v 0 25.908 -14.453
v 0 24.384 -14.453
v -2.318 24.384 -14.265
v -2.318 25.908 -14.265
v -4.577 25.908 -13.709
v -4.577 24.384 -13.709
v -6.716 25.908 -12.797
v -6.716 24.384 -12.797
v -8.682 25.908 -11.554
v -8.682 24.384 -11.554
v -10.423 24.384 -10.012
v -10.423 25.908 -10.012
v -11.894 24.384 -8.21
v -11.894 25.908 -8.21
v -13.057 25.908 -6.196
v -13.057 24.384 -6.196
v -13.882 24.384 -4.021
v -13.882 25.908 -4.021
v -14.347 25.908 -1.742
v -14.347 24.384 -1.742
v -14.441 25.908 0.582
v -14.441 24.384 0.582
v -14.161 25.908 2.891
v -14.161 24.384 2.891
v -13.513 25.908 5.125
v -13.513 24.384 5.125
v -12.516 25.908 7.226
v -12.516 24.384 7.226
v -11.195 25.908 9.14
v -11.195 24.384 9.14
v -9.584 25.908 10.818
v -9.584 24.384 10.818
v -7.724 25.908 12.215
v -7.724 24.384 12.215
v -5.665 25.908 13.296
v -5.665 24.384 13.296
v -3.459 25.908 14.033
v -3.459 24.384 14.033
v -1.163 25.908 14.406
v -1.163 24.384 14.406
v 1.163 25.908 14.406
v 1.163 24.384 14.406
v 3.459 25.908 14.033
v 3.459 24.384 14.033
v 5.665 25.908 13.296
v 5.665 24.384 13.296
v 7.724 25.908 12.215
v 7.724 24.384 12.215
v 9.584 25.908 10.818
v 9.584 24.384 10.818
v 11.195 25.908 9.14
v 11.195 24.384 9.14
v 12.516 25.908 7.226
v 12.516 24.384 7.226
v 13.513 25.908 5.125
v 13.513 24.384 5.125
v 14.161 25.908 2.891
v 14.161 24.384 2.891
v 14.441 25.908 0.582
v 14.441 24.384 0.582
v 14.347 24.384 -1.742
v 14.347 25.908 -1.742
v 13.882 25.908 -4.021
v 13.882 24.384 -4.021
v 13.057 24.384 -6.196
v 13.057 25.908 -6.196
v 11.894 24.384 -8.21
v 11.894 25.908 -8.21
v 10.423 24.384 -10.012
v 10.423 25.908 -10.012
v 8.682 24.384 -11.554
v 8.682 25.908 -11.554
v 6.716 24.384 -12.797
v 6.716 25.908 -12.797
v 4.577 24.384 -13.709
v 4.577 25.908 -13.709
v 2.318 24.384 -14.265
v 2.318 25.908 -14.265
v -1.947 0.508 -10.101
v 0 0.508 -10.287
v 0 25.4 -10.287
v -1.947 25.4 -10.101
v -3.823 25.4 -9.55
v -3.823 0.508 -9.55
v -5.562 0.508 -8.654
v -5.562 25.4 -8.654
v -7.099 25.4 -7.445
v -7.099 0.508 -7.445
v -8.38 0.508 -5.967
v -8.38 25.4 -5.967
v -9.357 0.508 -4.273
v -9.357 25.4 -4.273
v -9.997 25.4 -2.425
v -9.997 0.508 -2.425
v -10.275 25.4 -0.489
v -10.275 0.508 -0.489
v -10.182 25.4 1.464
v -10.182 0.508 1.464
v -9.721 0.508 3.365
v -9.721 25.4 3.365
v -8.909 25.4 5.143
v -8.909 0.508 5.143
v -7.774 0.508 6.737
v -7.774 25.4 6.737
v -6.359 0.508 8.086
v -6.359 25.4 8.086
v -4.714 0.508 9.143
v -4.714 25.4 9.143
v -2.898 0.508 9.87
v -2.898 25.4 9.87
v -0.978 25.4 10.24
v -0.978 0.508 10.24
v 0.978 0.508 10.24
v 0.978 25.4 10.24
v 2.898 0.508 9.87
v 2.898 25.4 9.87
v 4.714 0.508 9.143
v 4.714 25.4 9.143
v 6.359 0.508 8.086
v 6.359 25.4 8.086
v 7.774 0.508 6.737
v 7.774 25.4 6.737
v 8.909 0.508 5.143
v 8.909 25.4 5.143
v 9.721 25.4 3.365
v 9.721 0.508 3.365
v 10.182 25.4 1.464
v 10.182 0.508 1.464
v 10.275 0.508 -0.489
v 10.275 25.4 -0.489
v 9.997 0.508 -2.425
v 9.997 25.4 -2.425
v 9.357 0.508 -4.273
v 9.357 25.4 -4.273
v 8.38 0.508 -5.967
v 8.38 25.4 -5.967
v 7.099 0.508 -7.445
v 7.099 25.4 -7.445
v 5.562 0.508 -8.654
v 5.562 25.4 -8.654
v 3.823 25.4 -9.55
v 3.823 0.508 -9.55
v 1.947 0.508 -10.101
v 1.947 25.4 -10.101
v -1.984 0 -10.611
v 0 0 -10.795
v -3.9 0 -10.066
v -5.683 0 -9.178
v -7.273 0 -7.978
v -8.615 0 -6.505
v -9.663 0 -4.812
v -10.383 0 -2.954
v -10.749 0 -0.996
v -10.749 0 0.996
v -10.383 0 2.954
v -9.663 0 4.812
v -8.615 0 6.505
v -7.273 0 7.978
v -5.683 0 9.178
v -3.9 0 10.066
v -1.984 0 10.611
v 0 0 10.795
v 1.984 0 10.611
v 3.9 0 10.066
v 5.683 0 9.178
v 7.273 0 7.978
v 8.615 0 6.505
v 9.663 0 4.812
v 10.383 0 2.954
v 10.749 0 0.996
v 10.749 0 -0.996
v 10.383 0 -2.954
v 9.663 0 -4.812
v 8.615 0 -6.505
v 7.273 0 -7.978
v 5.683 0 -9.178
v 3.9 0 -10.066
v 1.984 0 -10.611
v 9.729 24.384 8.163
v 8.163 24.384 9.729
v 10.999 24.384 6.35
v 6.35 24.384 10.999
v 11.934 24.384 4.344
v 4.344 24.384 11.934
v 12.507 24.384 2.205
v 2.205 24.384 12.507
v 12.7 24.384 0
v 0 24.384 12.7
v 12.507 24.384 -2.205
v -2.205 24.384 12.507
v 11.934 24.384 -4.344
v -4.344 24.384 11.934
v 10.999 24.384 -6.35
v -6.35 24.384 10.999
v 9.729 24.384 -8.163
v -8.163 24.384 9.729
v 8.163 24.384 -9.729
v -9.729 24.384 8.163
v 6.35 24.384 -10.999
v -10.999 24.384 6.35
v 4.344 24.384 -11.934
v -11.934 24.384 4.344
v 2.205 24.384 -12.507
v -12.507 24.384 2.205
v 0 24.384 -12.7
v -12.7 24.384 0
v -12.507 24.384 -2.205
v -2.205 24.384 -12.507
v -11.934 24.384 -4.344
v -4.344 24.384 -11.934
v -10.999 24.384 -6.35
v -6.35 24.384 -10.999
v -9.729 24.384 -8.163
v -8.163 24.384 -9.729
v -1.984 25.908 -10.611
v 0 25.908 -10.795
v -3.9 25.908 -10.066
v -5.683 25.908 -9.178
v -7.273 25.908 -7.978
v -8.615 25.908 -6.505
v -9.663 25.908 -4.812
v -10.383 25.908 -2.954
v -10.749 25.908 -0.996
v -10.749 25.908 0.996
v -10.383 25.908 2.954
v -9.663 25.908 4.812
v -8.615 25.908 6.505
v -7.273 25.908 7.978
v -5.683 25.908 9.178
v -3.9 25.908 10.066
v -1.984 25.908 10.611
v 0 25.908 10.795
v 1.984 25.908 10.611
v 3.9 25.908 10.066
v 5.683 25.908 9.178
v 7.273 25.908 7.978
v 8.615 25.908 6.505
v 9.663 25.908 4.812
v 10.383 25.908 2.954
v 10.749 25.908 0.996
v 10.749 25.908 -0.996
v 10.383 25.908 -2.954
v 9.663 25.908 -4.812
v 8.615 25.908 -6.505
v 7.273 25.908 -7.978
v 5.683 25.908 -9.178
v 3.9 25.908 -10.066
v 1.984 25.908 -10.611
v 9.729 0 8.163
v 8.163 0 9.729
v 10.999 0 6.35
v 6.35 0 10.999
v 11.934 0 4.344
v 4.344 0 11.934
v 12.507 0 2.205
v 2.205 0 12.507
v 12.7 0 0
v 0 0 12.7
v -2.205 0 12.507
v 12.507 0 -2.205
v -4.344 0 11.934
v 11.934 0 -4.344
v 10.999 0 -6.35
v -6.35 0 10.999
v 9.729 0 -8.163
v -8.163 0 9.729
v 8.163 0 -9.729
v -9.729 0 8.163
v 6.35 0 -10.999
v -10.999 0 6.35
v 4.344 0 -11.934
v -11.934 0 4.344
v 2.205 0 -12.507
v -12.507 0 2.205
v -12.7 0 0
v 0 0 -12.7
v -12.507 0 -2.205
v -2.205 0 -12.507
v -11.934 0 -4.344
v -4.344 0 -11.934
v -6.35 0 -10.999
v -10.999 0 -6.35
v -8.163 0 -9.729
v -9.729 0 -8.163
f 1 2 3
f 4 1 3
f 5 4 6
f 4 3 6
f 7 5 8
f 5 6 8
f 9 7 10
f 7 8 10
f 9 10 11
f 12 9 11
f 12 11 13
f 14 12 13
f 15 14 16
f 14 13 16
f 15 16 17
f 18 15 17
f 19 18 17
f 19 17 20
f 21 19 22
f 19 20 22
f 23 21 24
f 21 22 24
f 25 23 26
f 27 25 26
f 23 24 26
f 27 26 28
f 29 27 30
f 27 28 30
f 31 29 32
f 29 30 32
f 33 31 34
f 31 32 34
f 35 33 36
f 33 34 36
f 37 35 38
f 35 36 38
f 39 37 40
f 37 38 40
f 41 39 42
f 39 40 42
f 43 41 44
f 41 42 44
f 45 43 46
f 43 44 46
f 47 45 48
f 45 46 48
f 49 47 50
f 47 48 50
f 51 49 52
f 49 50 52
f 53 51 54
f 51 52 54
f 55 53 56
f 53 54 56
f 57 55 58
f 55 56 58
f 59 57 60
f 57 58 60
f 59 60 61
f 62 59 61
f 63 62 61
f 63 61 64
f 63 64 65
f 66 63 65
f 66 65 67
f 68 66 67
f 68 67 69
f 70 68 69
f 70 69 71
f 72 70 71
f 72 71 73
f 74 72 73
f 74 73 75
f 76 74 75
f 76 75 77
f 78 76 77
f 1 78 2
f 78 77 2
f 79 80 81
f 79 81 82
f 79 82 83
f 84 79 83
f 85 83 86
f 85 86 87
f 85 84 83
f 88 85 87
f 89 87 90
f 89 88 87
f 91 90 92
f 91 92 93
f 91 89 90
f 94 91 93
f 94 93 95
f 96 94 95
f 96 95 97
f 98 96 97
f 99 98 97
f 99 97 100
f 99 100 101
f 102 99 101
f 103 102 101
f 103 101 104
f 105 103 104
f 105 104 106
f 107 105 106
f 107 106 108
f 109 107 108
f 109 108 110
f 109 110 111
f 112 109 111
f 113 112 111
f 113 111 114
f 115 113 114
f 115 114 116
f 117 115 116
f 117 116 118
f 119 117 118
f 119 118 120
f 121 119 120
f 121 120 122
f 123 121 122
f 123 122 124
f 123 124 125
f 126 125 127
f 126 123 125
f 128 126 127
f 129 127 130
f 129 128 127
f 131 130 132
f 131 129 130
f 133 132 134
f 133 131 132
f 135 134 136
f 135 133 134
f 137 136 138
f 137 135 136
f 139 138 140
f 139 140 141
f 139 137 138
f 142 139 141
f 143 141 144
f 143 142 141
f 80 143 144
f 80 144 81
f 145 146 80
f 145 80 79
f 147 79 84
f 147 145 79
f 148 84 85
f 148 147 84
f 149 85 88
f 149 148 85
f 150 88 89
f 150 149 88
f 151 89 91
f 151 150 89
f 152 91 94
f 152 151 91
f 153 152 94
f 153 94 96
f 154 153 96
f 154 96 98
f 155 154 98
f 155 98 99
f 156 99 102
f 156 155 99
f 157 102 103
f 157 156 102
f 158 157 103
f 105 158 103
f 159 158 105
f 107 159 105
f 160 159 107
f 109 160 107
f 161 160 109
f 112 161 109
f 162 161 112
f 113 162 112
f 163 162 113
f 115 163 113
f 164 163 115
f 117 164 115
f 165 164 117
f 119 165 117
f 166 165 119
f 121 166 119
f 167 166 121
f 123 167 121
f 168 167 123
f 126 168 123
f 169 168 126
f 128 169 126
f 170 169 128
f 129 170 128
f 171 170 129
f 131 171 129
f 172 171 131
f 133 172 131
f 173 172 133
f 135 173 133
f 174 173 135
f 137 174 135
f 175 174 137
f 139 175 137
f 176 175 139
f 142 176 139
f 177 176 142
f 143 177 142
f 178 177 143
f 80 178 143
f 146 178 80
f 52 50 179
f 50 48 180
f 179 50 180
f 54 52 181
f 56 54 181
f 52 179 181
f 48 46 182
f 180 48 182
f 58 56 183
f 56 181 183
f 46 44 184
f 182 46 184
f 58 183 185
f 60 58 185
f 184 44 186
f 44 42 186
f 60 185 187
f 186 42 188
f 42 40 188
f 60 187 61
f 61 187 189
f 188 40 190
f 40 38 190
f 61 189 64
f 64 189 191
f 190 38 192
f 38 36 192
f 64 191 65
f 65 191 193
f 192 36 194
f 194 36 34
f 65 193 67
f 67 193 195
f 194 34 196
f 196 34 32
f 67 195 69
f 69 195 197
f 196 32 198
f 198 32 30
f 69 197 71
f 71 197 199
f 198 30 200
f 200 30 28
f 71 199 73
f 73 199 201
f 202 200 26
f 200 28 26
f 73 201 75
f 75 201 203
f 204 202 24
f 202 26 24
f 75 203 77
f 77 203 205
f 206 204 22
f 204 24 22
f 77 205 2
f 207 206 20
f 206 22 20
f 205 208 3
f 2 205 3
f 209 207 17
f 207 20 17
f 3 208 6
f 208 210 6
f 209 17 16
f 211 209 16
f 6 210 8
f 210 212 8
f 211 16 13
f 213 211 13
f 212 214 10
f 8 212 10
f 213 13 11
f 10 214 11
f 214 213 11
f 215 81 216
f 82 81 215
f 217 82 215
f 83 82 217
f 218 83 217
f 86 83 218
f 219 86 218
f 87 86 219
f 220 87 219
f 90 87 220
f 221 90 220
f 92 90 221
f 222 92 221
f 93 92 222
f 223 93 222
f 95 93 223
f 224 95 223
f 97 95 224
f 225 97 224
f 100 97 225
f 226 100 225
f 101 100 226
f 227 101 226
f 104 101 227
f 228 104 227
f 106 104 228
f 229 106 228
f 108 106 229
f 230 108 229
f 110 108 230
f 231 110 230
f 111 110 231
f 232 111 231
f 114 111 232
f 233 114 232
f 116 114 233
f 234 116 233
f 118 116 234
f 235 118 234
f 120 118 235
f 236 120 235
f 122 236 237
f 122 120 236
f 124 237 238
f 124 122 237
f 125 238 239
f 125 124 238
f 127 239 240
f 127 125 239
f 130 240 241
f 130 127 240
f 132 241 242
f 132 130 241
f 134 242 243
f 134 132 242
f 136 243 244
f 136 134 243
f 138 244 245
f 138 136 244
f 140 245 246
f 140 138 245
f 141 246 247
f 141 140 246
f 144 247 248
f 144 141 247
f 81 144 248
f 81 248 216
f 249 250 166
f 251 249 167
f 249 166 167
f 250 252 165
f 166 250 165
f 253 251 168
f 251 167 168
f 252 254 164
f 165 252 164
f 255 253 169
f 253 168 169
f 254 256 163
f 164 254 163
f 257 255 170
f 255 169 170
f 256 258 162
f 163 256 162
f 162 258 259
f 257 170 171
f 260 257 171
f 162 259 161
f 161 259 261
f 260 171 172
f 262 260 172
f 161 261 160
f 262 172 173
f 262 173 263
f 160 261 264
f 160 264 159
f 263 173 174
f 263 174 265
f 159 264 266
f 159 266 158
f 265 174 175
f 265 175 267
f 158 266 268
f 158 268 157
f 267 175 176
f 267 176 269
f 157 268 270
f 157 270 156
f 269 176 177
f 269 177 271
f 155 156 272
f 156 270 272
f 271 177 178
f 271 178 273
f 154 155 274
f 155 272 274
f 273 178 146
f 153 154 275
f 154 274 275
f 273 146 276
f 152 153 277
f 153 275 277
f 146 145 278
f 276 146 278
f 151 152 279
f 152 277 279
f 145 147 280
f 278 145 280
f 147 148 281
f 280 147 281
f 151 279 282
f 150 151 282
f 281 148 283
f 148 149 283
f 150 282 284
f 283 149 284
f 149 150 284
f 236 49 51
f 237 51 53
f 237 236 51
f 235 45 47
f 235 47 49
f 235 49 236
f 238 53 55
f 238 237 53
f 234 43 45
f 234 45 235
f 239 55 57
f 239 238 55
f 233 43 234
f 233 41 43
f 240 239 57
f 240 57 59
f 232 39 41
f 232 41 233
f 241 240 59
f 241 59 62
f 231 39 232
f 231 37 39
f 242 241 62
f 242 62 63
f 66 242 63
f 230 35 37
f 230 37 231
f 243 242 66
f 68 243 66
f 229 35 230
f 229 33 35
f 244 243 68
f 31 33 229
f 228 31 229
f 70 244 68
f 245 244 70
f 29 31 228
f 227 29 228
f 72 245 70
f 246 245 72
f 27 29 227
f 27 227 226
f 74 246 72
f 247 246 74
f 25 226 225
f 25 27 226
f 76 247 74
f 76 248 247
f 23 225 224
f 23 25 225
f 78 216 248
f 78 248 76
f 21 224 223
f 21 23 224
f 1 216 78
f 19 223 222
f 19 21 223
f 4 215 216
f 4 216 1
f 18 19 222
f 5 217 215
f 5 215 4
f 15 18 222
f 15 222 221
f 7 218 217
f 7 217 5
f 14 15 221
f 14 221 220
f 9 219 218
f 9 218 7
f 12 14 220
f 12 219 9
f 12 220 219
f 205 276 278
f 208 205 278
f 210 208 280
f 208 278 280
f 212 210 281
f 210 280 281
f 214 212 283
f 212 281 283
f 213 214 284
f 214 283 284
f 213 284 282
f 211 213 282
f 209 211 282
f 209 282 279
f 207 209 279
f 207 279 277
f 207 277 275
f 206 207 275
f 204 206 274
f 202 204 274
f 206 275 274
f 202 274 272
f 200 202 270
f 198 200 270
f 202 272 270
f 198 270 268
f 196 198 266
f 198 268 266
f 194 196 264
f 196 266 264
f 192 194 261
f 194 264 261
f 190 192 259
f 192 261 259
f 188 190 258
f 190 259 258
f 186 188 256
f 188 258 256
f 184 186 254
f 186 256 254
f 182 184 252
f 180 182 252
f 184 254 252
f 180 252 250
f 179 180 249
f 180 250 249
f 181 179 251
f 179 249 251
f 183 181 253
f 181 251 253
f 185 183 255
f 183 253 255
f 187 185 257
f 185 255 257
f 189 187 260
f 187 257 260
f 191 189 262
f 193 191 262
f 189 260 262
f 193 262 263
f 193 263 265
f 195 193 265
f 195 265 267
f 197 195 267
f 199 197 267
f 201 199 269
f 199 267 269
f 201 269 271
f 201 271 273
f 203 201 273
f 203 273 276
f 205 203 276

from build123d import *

# Parameters (mm, degrees)
SKETCH1_R           = 12.7
SKETCH1_R_2         = 10.287
BOSS_EXTRUDE1_DEPTH = 24.384
SKETCH2_R           = 14.4526
SKETCH2_R_2         = 10.287
BOSS_EXTRUDE2_DEPTH = 1.524
CHAMFER1_SIZE       = 0.508


with BuildPart() as part:
    # Sketch1 → Boss-Extrude1 (new body)
    with BuildSketch(Plane(origin=(0, 0, 0), x_dir=(1, 0, 0), z_dir=(0, 1, 0))):
        with Locations(Location((0, 0, 0), (0, 0, 90))):
            Circle(SKETCH1_R)
        with Locations(Location((0, 0, 0), (0, 0, 90))):
            Circle(SKETCH1_R_2, mode=Mode.SUBTRACT)
    extrude(amount=BOSS_EXTRUDE1_DEPTH)

    # Sketch2 → Boss-Extrude2 (add)
    with BuildSketch(Plane(origin=(0, 24.384, 0), x_dir=(1, 0, 0), z_dir=(0, 1, 0))):
        with Locations(Location((0, 0, 0), (0, 0, 90))):
            Circle(SKETCH2_R)
        with Locations(Location((0, 0, 0), (0, 0, 90))):
            Circle(SKETCH2_R_2, mode=Mode.SUBTRACT)
    extrude(amount=BOSS_EXTRUDE2_DEPTH)

    # Chamfer1
    chamfer1_edges = [part.edges().sort_by_distance(p)[0] for p in [
        (0, 25.908, 10.287),
        (0, 0, 10.287),
    ]]
    chamfer(chamfer1_edges, length=CHAMFER1_SIZE)


solid = part.part
